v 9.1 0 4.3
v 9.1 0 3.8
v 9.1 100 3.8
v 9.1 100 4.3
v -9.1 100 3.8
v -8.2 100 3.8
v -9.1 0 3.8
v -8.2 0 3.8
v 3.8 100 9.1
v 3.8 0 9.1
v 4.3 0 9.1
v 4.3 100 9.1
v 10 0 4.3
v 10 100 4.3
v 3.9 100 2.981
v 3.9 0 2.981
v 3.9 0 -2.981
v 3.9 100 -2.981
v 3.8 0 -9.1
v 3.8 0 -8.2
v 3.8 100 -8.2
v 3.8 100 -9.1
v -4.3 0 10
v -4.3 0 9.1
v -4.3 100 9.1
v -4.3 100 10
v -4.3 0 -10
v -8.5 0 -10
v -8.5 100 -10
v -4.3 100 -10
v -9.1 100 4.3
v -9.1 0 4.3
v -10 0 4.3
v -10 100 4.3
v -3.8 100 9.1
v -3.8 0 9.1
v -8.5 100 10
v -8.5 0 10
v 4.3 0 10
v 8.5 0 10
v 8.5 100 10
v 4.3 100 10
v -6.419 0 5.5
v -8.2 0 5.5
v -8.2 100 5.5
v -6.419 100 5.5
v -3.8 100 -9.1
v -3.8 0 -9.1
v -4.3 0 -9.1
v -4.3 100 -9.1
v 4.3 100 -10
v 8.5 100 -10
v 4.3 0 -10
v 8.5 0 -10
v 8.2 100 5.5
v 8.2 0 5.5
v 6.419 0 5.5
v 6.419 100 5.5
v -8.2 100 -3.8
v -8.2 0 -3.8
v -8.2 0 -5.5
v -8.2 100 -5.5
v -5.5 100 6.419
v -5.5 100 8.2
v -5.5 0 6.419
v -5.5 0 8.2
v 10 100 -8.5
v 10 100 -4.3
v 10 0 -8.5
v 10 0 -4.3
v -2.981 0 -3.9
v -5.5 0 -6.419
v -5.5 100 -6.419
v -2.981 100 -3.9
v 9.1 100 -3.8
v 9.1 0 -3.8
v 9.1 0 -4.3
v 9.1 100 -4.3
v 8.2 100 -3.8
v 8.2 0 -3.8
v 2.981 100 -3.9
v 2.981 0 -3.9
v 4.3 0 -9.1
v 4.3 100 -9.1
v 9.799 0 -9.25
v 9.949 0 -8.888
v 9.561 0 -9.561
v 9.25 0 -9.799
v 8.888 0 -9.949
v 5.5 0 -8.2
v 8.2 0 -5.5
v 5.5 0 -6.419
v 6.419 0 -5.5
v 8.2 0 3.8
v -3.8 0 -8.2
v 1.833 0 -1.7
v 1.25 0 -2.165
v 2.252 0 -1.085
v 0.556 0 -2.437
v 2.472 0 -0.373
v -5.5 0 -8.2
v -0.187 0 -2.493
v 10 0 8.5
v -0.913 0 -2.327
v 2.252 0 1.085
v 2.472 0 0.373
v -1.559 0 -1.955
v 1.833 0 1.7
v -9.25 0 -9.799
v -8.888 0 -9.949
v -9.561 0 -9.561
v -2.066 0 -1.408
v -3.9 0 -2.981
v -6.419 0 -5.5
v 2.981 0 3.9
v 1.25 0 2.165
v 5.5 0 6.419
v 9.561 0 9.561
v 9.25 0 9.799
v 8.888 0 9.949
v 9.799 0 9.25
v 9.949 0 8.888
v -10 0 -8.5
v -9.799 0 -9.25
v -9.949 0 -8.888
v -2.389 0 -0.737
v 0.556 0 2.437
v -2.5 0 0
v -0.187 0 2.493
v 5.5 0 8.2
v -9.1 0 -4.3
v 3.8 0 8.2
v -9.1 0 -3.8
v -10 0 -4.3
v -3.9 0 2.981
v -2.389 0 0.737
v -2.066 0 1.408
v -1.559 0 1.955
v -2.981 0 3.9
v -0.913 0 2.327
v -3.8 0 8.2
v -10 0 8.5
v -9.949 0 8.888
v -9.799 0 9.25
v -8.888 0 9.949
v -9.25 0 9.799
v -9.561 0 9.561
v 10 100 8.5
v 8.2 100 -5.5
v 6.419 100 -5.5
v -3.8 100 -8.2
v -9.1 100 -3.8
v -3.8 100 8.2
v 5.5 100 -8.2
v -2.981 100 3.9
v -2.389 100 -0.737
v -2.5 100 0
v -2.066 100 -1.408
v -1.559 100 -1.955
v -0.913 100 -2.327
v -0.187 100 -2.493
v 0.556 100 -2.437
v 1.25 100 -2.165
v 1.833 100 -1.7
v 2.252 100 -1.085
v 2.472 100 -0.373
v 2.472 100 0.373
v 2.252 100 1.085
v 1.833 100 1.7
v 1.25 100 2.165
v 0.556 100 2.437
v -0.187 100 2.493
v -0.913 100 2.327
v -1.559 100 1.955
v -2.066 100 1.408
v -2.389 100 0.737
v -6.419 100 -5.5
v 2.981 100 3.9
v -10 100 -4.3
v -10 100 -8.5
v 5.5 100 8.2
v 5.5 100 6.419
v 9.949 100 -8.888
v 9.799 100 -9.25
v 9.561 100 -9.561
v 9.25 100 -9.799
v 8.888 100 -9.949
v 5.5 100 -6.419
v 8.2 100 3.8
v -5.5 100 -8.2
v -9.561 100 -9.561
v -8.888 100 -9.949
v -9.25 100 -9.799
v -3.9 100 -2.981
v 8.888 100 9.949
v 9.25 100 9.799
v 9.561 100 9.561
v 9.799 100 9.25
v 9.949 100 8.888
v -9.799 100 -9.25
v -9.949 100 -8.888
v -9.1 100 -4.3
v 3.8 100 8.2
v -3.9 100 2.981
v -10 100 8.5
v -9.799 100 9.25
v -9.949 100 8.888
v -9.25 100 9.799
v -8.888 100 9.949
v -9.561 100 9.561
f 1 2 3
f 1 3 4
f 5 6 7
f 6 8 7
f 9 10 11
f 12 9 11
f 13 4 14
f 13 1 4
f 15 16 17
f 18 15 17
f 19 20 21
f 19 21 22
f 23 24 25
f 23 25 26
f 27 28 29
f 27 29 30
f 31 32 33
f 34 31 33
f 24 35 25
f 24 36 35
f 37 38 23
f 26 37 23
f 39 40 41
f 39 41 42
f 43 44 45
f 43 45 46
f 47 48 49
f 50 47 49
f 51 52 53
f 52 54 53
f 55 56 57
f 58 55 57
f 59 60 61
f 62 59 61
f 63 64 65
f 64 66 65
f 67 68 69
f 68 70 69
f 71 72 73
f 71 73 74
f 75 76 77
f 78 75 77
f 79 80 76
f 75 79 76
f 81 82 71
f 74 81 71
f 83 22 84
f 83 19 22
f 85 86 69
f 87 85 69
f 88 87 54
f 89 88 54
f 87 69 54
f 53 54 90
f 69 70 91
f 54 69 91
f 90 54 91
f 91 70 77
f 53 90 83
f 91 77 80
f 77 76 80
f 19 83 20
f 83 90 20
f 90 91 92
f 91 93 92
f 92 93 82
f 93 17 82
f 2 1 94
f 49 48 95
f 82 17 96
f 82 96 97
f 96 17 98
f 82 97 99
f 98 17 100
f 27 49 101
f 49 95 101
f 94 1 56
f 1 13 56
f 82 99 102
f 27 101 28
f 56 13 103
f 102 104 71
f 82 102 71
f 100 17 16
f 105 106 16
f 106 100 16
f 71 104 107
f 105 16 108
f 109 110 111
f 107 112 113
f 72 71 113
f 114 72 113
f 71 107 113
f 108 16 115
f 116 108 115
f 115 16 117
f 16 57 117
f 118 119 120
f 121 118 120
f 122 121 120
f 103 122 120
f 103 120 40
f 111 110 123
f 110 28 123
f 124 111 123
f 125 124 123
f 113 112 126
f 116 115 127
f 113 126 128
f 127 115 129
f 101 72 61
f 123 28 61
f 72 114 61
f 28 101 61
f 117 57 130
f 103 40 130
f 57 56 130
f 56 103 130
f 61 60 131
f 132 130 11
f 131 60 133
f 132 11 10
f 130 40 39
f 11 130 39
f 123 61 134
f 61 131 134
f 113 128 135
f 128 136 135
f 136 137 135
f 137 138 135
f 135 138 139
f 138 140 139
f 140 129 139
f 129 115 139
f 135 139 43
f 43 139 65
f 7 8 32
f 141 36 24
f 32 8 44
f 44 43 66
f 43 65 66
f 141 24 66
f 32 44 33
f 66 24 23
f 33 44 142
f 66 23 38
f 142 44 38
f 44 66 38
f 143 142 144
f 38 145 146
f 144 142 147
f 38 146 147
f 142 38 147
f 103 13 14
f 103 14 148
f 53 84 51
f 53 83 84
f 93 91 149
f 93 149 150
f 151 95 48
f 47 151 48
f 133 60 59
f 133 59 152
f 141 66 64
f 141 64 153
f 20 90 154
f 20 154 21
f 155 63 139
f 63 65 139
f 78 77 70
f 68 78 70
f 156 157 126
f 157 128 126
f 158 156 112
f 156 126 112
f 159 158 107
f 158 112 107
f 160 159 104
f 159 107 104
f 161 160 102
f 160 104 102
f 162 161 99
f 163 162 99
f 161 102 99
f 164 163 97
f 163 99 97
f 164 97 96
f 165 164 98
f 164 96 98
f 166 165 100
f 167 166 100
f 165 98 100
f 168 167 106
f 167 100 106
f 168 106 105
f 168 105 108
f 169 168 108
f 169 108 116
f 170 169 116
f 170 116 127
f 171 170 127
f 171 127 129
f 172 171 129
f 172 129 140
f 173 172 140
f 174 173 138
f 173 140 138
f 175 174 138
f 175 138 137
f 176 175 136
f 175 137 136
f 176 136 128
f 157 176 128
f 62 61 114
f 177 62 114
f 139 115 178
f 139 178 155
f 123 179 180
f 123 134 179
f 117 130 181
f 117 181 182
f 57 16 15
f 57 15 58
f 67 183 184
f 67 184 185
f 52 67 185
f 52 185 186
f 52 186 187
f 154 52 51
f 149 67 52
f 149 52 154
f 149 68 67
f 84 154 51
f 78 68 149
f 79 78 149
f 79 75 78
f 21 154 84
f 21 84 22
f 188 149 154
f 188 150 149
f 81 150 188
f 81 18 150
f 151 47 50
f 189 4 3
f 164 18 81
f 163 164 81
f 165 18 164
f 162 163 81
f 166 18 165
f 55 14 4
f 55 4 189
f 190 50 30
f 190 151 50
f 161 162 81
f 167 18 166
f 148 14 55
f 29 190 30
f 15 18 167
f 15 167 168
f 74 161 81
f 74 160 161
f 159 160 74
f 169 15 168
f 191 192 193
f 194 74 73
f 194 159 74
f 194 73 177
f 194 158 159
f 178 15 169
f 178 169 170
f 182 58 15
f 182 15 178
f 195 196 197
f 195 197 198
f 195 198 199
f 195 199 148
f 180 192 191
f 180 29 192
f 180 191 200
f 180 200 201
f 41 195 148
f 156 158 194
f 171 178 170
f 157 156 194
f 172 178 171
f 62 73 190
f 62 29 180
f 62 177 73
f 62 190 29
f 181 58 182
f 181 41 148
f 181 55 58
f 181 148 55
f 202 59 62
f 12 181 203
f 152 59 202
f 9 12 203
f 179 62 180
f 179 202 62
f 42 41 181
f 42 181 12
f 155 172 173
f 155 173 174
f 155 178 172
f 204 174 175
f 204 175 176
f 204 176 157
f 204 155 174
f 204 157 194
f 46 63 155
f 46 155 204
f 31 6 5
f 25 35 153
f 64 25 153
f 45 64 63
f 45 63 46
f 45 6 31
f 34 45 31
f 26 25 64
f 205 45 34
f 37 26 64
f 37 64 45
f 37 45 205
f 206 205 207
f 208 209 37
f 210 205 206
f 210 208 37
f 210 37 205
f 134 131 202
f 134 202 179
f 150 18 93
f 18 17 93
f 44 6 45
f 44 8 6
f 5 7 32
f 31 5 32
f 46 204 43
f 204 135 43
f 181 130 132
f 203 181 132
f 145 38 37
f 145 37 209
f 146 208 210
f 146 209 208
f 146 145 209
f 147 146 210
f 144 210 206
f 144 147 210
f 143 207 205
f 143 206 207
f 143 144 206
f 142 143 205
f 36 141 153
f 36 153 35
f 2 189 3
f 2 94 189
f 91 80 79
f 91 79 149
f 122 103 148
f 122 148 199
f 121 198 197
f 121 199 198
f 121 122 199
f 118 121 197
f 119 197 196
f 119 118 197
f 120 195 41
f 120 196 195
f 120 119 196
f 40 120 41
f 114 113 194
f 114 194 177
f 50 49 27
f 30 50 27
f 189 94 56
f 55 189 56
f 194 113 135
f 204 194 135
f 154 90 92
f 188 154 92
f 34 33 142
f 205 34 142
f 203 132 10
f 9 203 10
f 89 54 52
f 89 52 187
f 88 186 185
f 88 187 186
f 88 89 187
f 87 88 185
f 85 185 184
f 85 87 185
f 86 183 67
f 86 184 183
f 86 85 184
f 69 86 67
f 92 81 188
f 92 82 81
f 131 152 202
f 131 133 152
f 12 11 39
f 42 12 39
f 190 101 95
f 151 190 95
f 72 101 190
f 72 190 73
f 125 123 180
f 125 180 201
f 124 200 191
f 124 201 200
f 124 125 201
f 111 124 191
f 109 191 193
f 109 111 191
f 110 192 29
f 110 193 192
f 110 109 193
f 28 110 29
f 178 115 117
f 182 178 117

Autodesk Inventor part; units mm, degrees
ref_plane "YZ Plane" through (0, 0, 0) normal (1, 0, 0) x (0, 1, 0)
ref_plane "起始平面" through (0, 0, 0) normal (0, 1, 0) x (-1, 0, 0)
ref_plane "终止平面" through (0, 100, 0) normal (0, 1, 0) x (-1, 0, 0)
sketch "草图" plane through (0, 0, 0) normal (0, 1, 0) x (-1, 0, 0)
  line L0 (-9.1, 10.0192) -> (-9.101, 10.0203)
  line L1 (-10, 10) -> (-9.5607, 9.5607) construction
  arc A0 (-8.5, 10) -> (-10, 8.5) centre (-8.5, 8.5) ccw
  circle A1 centre (0, 0) radius 2.5
  line L2 (-2.9808, 3.9) -> (0, 3.9)
  line L3 (-3.9, 0) -> (-3.9, 2.9808)
  line L4 (-2.5, 0) -> (-3.1, 0)
  line L5 (2.9808, 3.9) -> (0, 3.9)
  circle A2 centre (0, 0) radius 2.5
  circle A3 centre (0, 0) radius 2.5
  circle A4 centre (0, 0) radius 2.5
  line L6 (0, 16.3557) -> (0, -12.0006)
  line L7 (-4.3, 9.1) -> (-4.3, 10)
  line L8 (2.9808, -3.9) -> (0, -3.9)
  line L9 (-3.9, 0) -> (-3.9, -2.9808)
  line L10 (3.9, 0) -> (3.9, -2.9808)
  line L11 (-2.9808, -3.9) -> (-5.5, -6.4192)
  line L12 (-2.9808, -3.9) -> (0, -3.9)
  line L13 (3.8, -8.2) -> (3.8, -9.1)
  line L14 (5.5, -6.4192) -> (2.9808, -3.9)
  line L15 (3.8, -9.1) -> (4.3, -9.1)
  line L16 (5.5, -8.2) -> (3.8, -8.2)
  line L17 (5.5, -8.2) -> (5.5, -6.4192)
  line L18 (3.9, -2.9808) -> (6.4192, -5.5)
  line L19 (8.2, -3.8) -> (8.2, -5.5)
  line L20 (8.2, -5.5) -> (6.4192, -5.5)
  line L21 (8.2, -3.8) -> (9.1, -3.8)
  line L22 (9.1, -3.8) -> (9.1, -4.3)
  line L23 (9.1, -4.3) -> (10, -4.3)
  line L24 (10, -4.3) -> (10, -8.5)
  arc A5 (8.5, -10) -> (10, -8.5) centre (8.5, -8.5) ccw
  line L25 (8.5, -10) -> (4.3, -10)
  line L26 (4.3, -9.1) -> (4.3, -10)
  line L27 (5.5, 6.4192) -> (2.9808, 3.9)
  line L28 (3.9, 2.9808) -> (6.4192, 5.5)
  line L29 (10, 4.3) -> (10, 8.5)
  line L30 (3.9, 0) -> (3.9, 2.9808)
  line L31 (5.5, 8.2) -> (5.5, 6.4192)
  line L32 (5.5, 8.2) -> (3.8, 8.2)
  line L33 (4.3, 9.1) -> (4.3, 10)
  arc A6 (10, 8.5) -> (8.5, 10) centre (8.5, 8.5) ccw
  line L34 (8.5, 10) -> (4.3, 10)
  line L35 (8.2, 3.8) -> (9.1, 3.8)
  line L36 (9.1, 4.3) -> (10, 4.3)
  line L37 (9.1, 3.8) -> (9.1, 4.3)
  line L38 (8.2, 3.8) -> (8.2, 5.5)
  line L39 (8.2, 5.5) -> (6.4192, 5.5)
  line L40 (3.8, 8.2) -> (3.8, 9.1)
  line L41 (3.8, 9.1) -> (4.3, 9.1)
  line L42 (-10, 4.3) -> (-10, 8.5)
  line L43 (-8.5, 10) -> (-4.3, 10)
  line L44 (-9.1, 4.3) -> (-10, 4.3)
  line L45 (-9.1, 3.8) -> (-9.1, 4.3)
  line L46 (-8.2, 3.8) -> (-9.1, 3.8)
  line L47 (-8.2, 5.5) -> (-6.4192, 5.5)
  line L48 (-8.2, 3.8) -> (-8.2, 5.5)
  line L49 (-5.5, 8.2) -> (-5.5, 6.4192)
  line L50 (-3.8, 9.1) -> (-4.3, 9.1)
  line L51 (-3.8, 8.2) -> (-3.8, 9.1)
  line L52 (-5.5, 8.2) -> (-3.8, 8.2)
  line L53 (-3.9, 2.9808) -> (-6.4192, 5.5)
  line L54 (-2.9808, 3.9) -> (-5.5, 6.4192)
  line L55 (-5.5, -8.2) -> (-3.8, -8.2)
  line L56 (-5.5, -8.2) -> (-5.5, -6.4192)
  line L57 (-3.9, -2.9808) -> (-6.4192, -5.5)
  line L58 (-3.8, -8.2) -> (-3.8, -9.1)
  line L59 (-3.8, -9.1) -> (-4.3, -9.1)
  line L60 (-4.3, -9.1) -> (-4.3, -10)
  line L61 (-8.2, -5.5) -> (-6.4192, -5.5)
  line L62 (-8.2, -3.8) -> (-9.1, -3.8)
  line L63 (-9.1, -3.8) -> (-9.1, -4.3)
  line L64 (-8.5, -10) -> (-4.3, -10)
  line L65 (-9.1, -4.3) -> (-10, -4.3)
  line L66 (-10, -4.3) -> (-10, -8.5)
  arc A7 (-10, -8.5) -> (-8.5, -10) centre (-8.5, -8.5) ccw
  line L67 (-8.2, -3.8) -> (-8.2, -5.5)
  dimension "圆角" = 1.5
  dimension "宽度" = 20
extrude "实体" add sketch "草图" along normal up to surface (100 mm away) from surface at 0 contours L43 L7 L50 L51 L52 L49 L54 L2 L6 A1 L12 L11 L56 L55 L58 L59 L60 L64 A7 L66 L65 L63 L62 L67 L61 L57 L9 L3 L53 L47 L48 L46 L45 L44 L42 A0 | L5 L27 L31 L32 L40 L41 L33 L34 A6 L29 L36 L37 L35 L38 L39 L28 L30 L10 L18 L20 L19 L21 L22 L23 L24 A5 L25 L26 L15 L13 L16 L17 L14 L8 L6 A1
sketch "草图2" plane through (0, 0, 0) normal (0, 1, 0) x (-1, 0, 0)
  line L0 (0, 0) -> (10, 0)
ref_plane "工作平面3" through (0, 0, 0) normal (0, 0, -1) x (-1, 0, 0)
sketch "草图3" plane through (0, 0, 0) normal (0, 0, -1) x (-1, 0, 0)
  line L0 (-2, 0) -> (12, 0)
  line L1 (-2, 100) -> (12, 100)
  dimension "d11" = 100
equation "\"G_OFFSET_START\" = 0"
equation "\"G_OFFSET_END\" = 0"
equation "\"G_L\" = d11"
properties part number "欧标 2020铝合金钢材-01"
